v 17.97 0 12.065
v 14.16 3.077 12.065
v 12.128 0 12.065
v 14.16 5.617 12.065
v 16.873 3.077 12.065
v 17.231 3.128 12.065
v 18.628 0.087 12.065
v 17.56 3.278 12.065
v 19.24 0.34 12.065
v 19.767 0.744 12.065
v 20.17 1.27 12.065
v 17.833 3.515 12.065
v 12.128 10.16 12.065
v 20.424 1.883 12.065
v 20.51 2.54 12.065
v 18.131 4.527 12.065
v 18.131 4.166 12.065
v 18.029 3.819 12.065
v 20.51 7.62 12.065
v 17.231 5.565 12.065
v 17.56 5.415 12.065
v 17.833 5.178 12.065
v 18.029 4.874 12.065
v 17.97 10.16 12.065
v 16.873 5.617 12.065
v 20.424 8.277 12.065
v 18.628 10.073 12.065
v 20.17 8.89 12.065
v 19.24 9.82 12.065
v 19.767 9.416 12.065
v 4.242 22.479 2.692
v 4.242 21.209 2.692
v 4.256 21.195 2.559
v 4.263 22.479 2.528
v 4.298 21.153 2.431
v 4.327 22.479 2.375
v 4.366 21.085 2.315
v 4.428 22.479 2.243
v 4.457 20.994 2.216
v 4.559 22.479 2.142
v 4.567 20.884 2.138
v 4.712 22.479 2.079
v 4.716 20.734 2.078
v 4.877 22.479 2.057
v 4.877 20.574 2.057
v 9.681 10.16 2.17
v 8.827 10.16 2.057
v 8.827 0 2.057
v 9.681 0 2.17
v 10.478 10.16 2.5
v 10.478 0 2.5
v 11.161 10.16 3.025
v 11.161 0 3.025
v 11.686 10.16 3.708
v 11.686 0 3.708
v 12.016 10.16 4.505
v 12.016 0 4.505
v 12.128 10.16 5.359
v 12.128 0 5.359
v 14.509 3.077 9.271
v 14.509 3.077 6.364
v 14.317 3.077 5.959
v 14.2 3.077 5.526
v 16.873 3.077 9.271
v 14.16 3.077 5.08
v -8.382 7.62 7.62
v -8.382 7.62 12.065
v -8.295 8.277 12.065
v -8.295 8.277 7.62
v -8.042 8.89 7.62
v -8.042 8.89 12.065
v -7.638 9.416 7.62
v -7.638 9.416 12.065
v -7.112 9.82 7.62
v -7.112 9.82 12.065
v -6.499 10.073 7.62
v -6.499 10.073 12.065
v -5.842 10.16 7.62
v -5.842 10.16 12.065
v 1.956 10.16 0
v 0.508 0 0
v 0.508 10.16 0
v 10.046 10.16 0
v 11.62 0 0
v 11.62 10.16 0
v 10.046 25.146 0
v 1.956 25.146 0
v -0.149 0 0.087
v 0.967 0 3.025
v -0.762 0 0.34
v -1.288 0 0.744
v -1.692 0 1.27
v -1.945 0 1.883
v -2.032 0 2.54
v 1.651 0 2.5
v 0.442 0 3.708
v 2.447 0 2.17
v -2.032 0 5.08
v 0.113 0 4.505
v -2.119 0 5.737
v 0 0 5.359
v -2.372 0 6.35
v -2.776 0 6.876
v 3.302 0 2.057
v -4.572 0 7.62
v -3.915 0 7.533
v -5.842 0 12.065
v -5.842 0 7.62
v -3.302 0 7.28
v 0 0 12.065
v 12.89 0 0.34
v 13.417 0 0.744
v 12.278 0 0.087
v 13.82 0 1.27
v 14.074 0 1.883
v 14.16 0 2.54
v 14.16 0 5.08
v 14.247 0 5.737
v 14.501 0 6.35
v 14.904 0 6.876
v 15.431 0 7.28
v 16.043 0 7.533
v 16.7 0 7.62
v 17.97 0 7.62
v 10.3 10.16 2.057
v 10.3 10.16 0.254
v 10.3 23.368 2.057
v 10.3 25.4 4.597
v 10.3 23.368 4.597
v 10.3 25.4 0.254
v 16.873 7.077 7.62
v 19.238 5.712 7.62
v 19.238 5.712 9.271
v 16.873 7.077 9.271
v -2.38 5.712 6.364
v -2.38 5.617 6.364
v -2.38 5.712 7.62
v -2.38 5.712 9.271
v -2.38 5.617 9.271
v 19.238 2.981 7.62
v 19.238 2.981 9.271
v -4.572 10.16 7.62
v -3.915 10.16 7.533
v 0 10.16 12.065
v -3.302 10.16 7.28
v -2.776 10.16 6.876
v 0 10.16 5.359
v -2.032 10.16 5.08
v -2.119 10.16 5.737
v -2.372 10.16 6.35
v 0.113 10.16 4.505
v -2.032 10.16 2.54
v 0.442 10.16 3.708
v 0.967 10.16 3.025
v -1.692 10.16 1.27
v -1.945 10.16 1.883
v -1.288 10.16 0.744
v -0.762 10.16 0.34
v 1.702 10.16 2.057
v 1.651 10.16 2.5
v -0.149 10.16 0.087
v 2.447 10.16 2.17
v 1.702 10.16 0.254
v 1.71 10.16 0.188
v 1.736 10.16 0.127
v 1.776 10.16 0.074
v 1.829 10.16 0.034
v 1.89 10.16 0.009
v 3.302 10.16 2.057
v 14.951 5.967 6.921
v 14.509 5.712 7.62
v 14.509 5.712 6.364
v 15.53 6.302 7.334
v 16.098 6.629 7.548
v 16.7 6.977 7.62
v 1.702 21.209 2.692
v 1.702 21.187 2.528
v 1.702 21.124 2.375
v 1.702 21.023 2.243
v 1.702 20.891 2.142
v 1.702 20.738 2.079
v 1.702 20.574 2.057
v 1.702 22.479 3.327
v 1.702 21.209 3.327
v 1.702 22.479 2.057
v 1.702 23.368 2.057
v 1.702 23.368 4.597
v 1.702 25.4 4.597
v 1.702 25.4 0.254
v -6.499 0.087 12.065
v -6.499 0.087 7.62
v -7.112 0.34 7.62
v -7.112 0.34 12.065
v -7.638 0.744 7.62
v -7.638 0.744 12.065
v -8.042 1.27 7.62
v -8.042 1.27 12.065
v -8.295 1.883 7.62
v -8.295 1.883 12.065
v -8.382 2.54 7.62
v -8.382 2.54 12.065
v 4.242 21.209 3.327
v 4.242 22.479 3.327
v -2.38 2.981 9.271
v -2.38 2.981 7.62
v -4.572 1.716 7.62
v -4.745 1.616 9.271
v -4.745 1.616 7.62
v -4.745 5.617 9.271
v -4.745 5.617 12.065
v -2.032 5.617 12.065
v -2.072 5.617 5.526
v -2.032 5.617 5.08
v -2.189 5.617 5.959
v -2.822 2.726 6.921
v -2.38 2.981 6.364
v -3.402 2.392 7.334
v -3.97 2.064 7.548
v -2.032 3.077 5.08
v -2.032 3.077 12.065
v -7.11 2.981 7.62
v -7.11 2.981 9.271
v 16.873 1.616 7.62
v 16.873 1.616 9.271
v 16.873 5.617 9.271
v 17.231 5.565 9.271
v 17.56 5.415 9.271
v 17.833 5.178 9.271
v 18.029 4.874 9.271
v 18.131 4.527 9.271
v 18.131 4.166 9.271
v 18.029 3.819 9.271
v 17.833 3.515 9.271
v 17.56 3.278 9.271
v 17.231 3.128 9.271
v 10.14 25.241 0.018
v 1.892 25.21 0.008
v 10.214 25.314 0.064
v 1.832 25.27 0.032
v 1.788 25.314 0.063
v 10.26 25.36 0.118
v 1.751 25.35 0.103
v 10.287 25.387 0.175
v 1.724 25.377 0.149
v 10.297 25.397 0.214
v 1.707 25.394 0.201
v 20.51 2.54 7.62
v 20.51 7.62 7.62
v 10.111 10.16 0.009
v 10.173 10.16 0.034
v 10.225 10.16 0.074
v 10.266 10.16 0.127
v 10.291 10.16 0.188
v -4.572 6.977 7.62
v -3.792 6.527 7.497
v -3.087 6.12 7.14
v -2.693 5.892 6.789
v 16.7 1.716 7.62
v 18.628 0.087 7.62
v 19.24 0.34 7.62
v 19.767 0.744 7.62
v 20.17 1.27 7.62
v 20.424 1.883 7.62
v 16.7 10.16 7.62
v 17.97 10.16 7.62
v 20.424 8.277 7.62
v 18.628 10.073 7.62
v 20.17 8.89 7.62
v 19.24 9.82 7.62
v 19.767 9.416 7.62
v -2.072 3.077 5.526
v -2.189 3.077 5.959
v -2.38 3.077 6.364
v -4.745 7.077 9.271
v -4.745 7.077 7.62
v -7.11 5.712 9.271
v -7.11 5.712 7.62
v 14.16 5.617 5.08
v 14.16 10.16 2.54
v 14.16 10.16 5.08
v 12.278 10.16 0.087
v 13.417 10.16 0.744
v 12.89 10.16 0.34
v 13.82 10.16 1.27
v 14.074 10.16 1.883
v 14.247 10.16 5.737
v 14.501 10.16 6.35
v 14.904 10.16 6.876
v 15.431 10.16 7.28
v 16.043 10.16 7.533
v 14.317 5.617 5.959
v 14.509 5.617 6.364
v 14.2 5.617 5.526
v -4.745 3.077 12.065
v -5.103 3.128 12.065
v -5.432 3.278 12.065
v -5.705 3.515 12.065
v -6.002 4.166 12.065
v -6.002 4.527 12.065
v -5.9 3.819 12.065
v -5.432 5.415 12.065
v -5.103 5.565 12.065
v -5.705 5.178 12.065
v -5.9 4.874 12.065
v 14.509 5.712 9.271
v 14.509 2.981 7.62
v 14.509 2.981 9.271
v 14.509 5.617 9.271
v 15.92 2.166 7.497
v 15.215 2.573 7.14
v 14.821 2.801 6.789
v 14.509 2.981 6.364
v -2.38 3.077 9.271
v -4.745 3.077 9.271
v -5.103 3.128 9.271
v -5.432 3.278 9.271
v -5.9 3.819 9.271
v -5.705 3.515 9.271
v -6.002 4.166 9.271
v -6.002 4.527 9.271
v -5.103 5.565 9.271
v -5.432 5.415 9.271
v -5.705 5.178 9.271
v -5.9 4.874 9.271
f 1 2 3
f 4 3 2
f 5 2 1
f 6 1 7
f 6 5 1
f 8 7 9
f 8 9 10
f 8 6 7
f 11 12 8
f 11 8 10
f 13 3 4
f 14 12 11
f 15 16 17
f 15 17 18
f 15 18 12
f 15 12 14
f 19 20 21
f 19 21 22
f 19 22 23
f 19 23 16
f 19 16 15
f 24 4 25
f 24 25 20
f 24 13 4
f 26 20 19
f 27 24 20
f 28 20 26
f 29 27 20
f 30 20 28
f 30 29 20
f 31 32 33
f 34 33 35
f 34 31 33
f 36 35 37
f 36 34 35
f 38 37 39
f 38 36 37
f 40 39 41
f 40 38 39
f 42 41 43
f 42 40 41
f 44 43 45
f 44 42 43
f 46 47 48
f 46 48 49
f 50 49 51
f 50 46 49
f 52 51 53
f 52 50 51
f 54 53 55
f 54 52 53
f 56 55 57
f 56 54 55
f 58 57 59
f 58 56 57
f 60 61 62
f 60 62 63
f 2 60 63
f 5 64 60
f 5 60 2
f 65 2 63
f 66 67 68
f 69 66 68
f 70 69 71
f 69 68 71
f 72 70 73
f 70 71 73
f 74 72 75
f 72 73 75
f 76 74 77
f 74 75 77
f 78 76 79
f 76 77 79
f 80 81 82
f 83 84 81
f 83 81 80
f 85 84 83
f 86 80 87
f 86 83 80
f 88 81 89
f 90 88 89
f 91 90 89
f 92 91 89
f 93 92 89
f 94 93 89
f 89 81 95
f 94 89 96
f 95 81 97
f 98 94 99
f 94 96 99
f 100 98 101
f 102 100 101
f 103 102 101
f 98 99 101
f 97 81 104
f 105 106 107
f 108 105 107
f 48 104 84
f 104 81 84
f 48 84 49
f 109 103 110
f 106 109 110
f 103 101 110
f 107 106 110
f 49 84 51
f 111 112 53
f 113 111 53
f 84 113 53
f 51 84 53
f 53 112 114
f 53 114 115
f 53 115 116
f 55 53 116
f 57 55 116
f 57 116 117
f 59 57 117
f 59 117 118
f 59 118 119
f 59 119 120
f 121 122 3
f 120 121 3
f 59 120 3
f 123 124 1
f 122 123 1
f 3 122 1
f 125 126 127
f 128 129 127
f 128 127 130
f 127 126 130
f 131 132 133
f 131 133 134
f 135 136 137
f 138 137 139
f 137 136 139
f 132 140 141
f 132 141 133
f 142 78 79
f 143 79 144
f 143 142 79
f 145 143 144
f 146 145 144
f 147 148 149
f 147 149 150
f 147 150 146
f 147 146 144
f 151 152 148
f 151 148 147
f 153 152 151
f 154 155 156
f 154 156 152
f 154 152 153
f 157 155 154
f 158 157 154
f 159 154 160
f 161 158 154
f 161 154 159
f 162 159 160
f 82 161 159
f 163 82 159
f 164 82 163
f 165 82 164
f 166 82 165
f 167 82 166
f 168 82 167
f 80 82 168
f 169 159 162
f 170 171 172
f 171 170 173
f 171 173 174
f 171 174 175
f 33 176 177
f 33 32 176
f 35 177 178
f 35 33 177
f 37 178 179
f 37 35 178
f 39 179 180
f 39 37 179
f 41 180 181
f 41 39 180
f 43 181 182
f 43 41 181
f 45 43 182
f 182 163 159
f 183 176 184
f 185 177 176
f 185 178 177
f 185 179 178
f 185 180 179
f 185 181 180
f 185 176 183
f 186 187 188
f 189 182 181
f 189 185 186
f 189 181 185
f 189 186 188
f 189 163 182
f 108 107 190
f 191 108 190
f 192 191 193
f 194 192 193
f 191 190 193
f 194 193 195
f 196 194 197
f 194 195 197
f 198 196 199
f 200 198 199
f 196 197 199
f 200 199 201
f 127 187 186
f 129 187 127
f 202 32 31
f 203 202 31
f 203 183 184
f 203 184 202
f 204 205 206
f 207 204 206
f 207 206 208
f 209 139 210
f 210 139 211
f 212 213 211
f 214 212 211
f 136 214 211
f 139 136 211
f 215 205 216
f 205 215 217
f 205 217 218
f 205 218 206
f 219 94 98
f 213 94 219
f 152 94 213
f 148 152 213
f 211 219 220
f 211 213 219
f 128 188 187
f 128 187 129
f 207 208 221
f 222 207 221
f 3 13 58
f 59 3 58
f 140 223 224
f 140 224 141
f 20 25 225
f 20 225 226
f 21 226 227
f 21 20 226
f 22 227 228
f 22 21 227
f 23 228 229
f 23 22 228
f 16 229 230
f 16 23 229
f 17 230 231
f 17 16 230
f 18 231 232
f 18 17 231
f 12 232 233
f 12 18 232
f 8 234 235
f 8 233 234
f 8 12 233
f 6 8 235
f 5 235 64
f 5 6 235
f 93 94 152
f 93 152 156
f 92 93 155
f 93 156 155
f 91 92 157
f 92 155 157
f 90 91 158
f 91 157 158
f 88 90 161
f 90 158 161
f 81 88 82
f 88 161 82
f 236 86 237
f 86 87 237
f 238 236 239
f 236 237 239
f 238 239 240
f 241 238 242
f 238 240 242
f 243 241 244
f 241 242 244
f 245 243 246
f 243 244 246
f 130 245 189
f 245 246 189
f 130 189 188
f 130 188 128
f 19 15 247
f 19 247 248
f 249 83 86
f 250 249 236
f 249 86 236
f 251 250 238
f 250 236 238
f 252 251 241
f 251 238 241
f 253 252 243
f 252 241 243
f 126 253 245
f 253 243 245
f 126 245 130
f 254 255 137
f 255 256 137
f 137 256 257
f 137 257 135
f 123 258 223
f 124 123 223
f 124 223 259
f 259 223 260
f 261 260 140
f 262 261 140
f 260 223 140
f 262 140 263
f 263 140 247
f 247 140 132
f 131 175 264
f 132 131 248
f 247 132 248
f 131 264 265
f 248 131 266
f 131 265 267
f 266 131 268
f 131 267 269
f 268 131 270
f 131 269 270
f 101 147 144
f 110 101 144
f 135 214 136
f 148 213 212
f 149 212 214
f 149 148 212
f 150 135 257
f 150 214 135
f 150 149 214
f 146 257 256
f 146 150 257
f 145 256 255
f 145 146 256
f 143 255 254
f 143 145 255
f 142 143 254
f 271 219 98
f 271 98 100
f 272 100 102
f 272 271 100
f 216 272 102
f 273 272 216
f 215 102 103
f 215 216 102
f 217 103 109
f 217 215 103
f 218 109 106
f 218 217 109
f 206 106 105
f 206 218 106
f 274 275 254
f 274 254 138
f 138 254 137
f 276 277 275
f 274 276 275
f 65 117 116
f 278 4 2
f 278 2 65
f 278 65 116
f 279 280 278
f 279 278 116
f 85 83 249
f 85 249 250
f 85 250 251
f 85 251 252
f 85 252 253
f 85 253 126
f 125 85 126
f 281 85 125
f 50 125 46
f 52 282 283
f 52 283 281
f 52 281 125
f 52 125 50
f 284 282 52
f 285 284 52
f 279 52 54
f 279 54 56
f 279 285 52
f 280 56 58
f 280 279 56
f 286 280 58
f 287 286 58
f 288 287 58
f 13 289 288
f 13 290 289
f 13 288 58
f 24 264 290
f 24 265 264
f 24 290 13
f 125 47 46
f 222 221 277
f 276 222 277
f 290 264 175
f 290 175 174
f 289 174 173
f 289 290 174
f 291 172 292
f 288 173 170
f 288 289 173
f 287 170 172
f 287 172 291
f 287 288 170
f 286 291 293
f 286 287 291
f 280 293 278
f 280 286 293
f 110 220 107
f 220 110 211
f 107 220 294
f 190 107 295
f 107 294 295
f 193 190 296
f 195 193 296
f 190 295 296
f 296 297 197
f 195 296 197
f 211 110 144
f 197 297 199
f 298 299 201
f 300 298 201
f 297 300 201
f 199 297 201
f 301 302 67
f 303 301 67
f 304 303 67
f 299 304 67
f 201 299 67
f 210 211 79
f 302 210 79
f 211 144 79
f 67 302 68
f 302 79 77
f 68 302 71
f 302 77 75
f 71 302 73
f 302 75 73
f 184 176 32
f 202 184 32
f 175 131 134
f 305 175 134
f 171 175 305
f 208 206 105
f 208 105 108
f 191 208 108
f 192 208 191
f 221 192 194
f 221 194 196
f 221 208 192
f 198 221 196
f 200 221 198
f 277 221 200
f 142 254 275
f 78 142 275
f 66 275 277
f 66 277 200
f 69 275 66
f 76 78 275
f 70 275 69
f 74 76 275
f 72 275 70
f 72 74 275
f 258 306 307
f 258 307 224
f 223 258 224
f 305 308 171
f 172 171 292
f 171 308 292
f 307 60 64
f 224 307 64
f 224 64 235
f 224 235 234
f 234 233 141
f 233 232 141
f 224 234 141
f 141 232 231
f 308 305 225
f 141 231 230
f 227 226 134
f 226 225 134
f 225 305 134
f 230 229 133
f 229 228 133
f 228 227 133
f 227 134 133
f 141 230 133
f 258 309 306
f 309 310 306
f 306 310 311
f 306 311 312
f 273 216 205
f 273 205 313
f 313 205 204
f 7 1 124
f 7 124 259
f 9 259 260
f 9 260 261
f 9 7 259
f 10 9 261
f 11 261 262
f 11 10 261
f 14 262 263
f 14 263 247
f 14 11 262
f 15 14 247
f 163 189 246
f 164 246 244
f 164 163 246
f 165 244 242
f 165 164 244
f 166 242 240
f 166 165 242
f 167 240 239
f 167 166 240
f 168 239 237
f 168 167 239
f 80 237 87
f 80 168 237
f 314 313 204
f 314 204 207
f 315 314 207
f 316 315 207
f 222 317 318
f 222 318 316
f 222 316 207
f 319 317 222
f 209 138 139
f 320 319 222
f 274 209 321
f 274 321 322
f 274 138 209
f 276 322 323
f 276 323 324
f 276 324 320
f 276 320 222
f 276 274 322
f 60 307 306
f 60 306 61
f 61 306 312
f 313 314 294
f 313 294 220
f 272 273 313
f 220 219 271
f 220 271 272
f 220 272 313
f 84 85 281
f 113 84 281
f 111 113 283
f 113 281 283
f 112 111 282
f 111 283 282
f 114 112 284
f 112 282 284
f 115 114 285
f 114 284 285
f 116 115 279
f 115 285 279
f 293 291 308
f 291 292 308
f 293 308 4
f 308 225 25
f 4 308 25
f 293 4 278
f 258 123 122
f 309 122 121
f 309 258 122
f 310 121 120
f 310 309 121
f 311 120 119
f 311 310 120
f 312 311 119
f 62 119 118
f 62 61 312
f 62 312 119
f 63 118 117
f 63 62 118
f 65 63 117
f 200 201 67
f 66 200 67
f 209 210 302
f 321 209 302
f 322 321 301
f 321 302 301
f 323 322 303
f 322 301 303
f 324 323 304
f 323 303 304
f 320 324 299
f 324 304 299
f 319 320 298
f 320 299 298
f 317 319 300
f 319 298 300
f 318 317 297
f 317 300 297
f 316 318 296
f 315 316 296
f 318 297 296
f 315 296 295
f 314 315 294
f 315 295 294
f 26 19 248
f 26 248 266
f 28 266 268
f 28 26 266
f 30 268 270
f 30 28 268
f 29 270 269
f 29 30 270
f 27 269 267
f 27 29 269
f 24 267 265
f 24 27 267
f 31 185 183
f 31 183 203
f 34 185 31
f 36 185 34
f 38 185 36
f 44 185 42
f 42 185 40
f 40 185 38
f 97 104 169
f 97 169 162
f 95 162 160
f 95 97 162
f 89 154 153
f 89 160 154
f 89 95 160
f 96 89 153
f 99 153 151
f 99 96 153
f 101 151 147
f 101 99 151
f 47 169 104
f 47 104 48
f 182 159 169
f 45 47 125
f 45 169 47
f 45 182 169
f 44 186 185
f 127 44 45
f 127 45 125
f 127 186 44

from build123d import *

# Parameters (mm, degrees)
BOSS_EXTRUDE1_DEPTH = 2.0574
SKETCH4_W           = 12.065
SKETCH4_H           = 10.16
BOSS_EXTRUDE2_DEPTH = 2.032
SKETCH5_W           = 12.065
SKETCH5_H           = 10.16
BOSS_EXTRUDE3_DEPTH = 2.032
SKETCH8_W           = 8.5979
SKETCH8_H           = 2.032
BOSS_EXTRUDE4_DEPTH = 2.54
FILLET22_R          = 3.302
CUT_EXTRUDE12_DEPTH = 13.208
SKETCH28_W          = 2.54
SKETCH28_H          = 1.27
BOSS_EXTRUDE6_DEPTH = 1.27
BOSS_EXTRUDE7_DEPTH = 4.445
FILLET23_R          = 0.635
CUT_EXTRUDE15_DEPTH = 1.651
FILLET25_R          = 0.254
FILLET26_R          = 2.54


with BuildPart() as part:
    # Sketch1 → Boss-Extrude1 (new body)
    with BuildSketch(Plane.XY):
        Polygon((0, 0), (12.1285, 0), (12.1285, 10.16), (10.2997, 10.16), (10.2997, 25.4), (1.7018, 25.4), (1.7018, 10.16), (0, 10.16), align=None)
    extrude(amount=BOSS_EXTRUDE1_DEPTH)

    # Sketch4 → Boss-Extrude2 (add)
    with BuildSketch(Plane(origin=(12.1285, 0, 0), x_dir=(0, 0, -1), z_dir=(1, 0, 0))):
        with Locations((-6.0325, 5.08)):
            Rectangle(SKETCH4_W, SKETCH4_H)
    extrude(amount=BOSS_EXTRUDE2_DEPTH)

    # Sketch5 → Boss-Extrude3 (add)
    with BuildSketch(Plane.ZY):
        with Locations((6.0325, 5.08)):
            Rectangle(SKETCH5_W, SKETCH5_H)
    extrude(amount=BOSS_EXTRUDE3_DEPTH)

    # Sketch8 → Boss-Extrude4 (add)
    with BuildSketch(Plane.XY.offset(2.0574)):
        with Locations((6.00075, 24.384)):
            Rectangle(SKETCH8_W, SKETCH8_H)
    extrude(amount=BOSS_EXTRUDE4_DEPTH)

    # Fillet22
    fillet22_edges = [part.edges().sort_by_distance(p)[0] for p in [
        (12.1285, 5.08, 2.0574),
        (0, 5.08, 2.0574),
    ]]
    fillet(fillet22_edges, radius=FILLET22_R)

    # Sketch26 → Cut-Extrude12 (cut)
    with BuildSketch(Plane.XZ.offset(-23.368)):
        Polygon((8.382, 4.5974), (1.7018, 4.5974), (1.620324679, 2.0574), (10.2997, 2.0574), (10.2997, 4.5974), align=None)
    extrude(amount=CUT_EXTRUDE12_DEPTH, mode=Mode.SUBTRACT)

    # Sketch28 → Boss-Extrude6 (add)
    with BuildSketch(Plane.XY.offset(2.0574)):
        with Locations((2.9718, 21.844)):
            Rectangle(SKETCH28_W, SKETCH28_H)
    extrude(amount=BOSS_EXTRUDE6_DEPTH)

    # Sketch30 → Boss-Extrude7 (add)
    with BuildSketch(Plane(origin=(0, 0, 12.065), x_dir=(-1, 0, 0), z_dir=(0, 0, -1))):
        with BuildLine():
            Line((2.032, 3.076559617), (2.032, 0))
            Line((2.032, 0), (5.842, 0))
            ThreePointArc((5.842, 0), (7.638051224, 0.743948776), (8.382, 2.54))
            Line((8.382, 2.54), (8.382, 7.62))
            ThreePointArc((8.382, 7.62), (7.638051224, 9.416051224), (5.842, 10.16))
            Line((5.842, 10.16), (2.032, 10.16))
            Line((2.032, 10.16), (2.032, 5.616559617))
            Line((2.032, 5.616559617), (4.744929833, 5.616559617))
            ThreePointArc((4.744929833, 5.616559617), (6.014929833, 4.346559617), (4.744929833, 3.076559617))
            Line((4.744929833, 3.076559617), (2.032, 3.076559617))
        make_face()
    boss_extrude7 = extrude(amount=BOSS_EXTRUDE7_DEPTH)

    # Fillet23
    fillet23_edges = [part.edges().sort_by_distance(p)[0] for p in [
        (2.9718, 21.209, 2.0574),
        (4.2418, 21.844, 2.0574),
    ]]
    fillet(fillet23_edges, radius=FILLET23_R)

    # Sketch34 → Cut-Extrude15 (cut)
    with BuildSketch(Plane(origin=(0, 0, 7.62), x_dir=(-1, 0, 0), z_dir=(0, 0, -1))):
        Polygon((4.744929833, 7.077059617), (2.380247468, 5.711809617), (2.380247468, 2.981309617), (4.744929833, 1.616059617), (7.109612198, 2.981309617), (7.109612198, 5.711809617), align=None)
    cut_extrude15 = extrude(amount=-CUT_EXTRUDE15_DEPTH, mode=Mode.SUBTRACT)

    # Fillet25
    fillet25_edges = [part.edges().sort_by_distance(p)[0] for p in [
        (1.7018, 17.78, 0),
        (6.00075, 25.4, 0),
        (10.2997, 17.78, 0),
    ]]
    fillet(fillet25_edges, radius=FILLET25_R)

    # Mirror7: Boss-Extrude7, Cut-Extrude15 across plane
    add(boss_extrude7.mirror(Plane(origin=(6.06425, 0, 0), x_dir=(0, 0, 1), z_dir=(1, 0, 0))))
    add(cut_extrude15.mirror(Plane(origin=(6.06425, 0, 0), x_dir=(0, 0, 1), z_dir=(1, 0, 0))), mode=Mode.SUBTRACT)

    # Fillet26
    # the kernel refuses this fillet: 2.54 mm, written as the material it adds along each edge
    with BuildSketch(Plane(origin=(-2.032, 9.426559617, 7.62), x_dir=(-1, 0, 0), z_dir=(0, -1, 0))) as fillet26_piece_1_section:
        with BuildLine():
            CenterArc((FILLET26_R, FILLET26_R), FILLET26_R, 180, 90)
            Line((0, FILLET26_R), (0, 0))
            Line((0, 0), (FILLET26_R, 0))
        make_face()
    fillet26_piece_1 = extrude(amount=15.776559617, mode=Mode.PRIVATE)
    fillet26_piece_1 = split(fillet26_piece_1, bisect_by=Plane(origin=(-2.868298698, 5.616559617, 7.255726229), z_dir=(0, 1, 0)), keep=Keep.TOP, mode=Mode.PRIVATE)
    fillet26_piece_1 = split(fillet26_piece_1, bisect_by=Plane(origin=(-3.61155926, 6.422707812, 7.255726229), z_dir=(0.5000000000000006, 0.8660254037844384, 0)), keep=Keep.TOP, mode=Mode.PRIVATE)
    add(fillet26_piece_1)
    with BuildSketch(Plane(origin=(-2.032, 9.426559617, 7.62), x_dir=(-1, 0, 0), z_dir=(0, -1, 0))) as fillet26_piece_2_section:
        with BuildLine():
            CenterArc((FILLET26_R, FILLET26_R), FILLET26_R, 180, 90)
            Line((0, FILLET26_R), (0, 0))
            Line((0, 0), (FILLET26_R, 0))
        make_face()
    fillet26_piece_2 = extrude(amount=15.776559617, mode=Mode.PRIVATE)
    fillet26_piece_2 = split(fillet26_piece_2, bisect_by=Plane(origin=(-2.323081937, 5.616559617, 6.938732997), z_dir=(0, 1, 0)), keep=Keep.TOP, mode=Mode.PRIVATE)
    fillet26_piece_2 = split(fillet26_piece_2, bisect_by=Plane(origin=(-2.380247468, 5.647682341, 6.938732997), z_dir=(1, 0, 0)), keep=Keep.TOP, mode=Mode.PRIVATE)
    add(fillet26_piece_2)
    with BuildSketch(Plane(origin=(-2.032, 3.076559617, 7.62), x_dir=(-1, 0, 0), z_dir=(0, -1, 0))) as fillet26_piece_3_section:
        with BuildLine():
            CenterArc((FILLET26_R, FILLET26_R), FILLET26_R, 180, 90)
            Line((0, FILLET26_R), (0, 0))
            Line((0, 0), (FILLET26_R, 0))
        make_face()
    fillet26_piece_3 = extrude(amount=3.076559617, mode=Mode.PRIVATE)
    fillet26_piece_3 = split(fillet26_piece_3, bisect_by=Plane(origin=(-2.380247468, 3.045436894, 6.938732997), z_dir=(1, 0, 0)), keep=Keep.TOP, mode=Mode.PRIVATE)
    add(fillet26_piece_3)
    with BuildSketch(Plane(origin=(-2.032, 9.426559617, 7.62), x_dir=(-1, 0, 0), z_dir=(0, -1, 0))) as fillet26_piece_4_section:
        with BuildLine():
            CenterArc((FILLET26_R, FILLET26_R), FILLET26_R, 180, 90)
            Line((0, FILLET26_R), (0, 0))
            Line((0, 0), (FILLET26_R, 0))
        make_face()
    fillet26_piece_4 = extrude(amount=9.426559617, mode=Mode.PRIVATE)
    fillet26_piece_4 = split(fillet26_piece_4, bisect_by=Plane(origin=(-2.380247468, 1.352070174, 7.252623905), z_dir=(-1, 0, 0)), keep=Keep.TOP, mode=Mode.PRIVATE)
    fillet26_piece_4 = split(fillet26_piece_4, bisect_by=Plane(origin=(-3.445782292, 2.3661228, 7.252623905), z_dir=(0.5000000000000002, -0.8660254037844386, 0)), keep=Keep.TOP, mode=Mode.PRIVATE)
    add(fillet26_piece_4)
    with BuildSketch(Plane(origin=(-2.032, 10.16, 7.62), x_dir=(-1, 0, 0), z_dir=(0, -1, 0))) as fillet26_piece_5_section:
        with BuildLine():
            CenterArc((FILLET26_R, FILLET26_R), FILLET26_R, 180, 90)
            Line((0, FILLET26_R), (0, 0))
            Line((0, 0), (FILLET26_R, 0))
        make_face()
    fillet26_piece_5 = extrude(amount=4.543440383, mode=Mode.PRIVATE)
    fillet26_piece_5 = split(fillet26_piece_5, bisect_by=Plane(origin=(-3.774867909, 6.516994104, 7.257731874), z_dir=(0.5000000000000006, 0.8660254037844384, 0)), keep=Keep.TOP, mode=Mode.PRIVATE)
    add(fillet26_piece_5)
    with BuildSketch(Plane(origin=(-2.032, 16.51, 7.62), x_dir=(-1, 0, 0), z_dir=(0, -1, 0))) as fillet26_piece_6_section:
        with BuildLine():
            CenterArc((FILLET26_R, FILLET26_R), FILLET26_R, 180, 90)
            Line((0, FILLET26_R), (0, 0))
            Line((0, 0), (FILLET26_R, 0))
        make_face()
    fillet26_piece_6 = extrude(amount=10.893440383, mode=Mode.PRIVATE)
    fillet26_piece_6 = split(fillet26_piece_6, bisect_by=Plane(origin=(-2.380247468, 5.647682341, 6.938732997), z_dir=(1, 0, 0)), keep=Keep.TOP, mode=Mode.PRIVATE)
    fillet26_piece_6 = split(fillet26_piece_6, bisect_by=Plane(origin=(-2.309605395, 5.671024397, 6.938732997), z_dir=(-0.5000000000000006, -0.8660254037844384, 0)), keep=Keep.TOP, mode=Mode.PRIVATE)
    add(fillet26_piece_6)
    with BuildSketch(Plane(origin=(-2.032, 16.51, 7.62), x_dir=(-1, 0, 0), z_dir=(0, -1, 0))) as fillet26_piece_7_section:
        with BuildLine():
            CenterArc((FILLET26_R, FILLET26_R), FILLET26_R, 180, 90)
            Line((0, FILLET26_R), (0, 0))
            Line((0, 0), (FILLET26_R, 0))
        make_face()
    fillet26_piece_7 = extrude(amount=17.243440383, mode=Mode.PRIVATE)
    fillet26_piece_7 = split(fillet26_piece_7, bisect_by=Plane(origin=(-2.323081937, 0, 6.938732997), z_dir=(0, 1, 0)), keep=Keep.TOP, mode=Mode.PRIVATE)
    fillet26_piece_7 = split(fillet26_piece_7, bisect_by=Plane(origin=(-2.323081937, 3.076559617, 6.938732997), z_dir=(0, -1, 0)), keep=Keep.TOP, mode=Mode.PRIVATE)
    fillet26_piece_7 = split(fillet26_piece_7, bisect_by=Plane(origin=(-2.380247468, 3.045436894, 6.938732997), z_dir=(1, 0, 0)), keep=Keep.TOP, mode=Mode.PRIVATE)
    add(fillet26_piece_7)
    with BuildSketch(Plane(origin=(-2.032, 16.51, 7.62), x_dir=(-1, 0, 0), z_dir=(0, -1, 0))) as fillet26_piece_8_section:
        with BuildLine():
            CenterArc((FILLET26_R, FILLET26_R), FILLET26_R, 180, 90)
            Line((0, FILLET26_R), (0, 0))
            Line((0, 0), (FILLET26_R, 0))
        make_face()
    fillet26_piece_8 = extrude(amount=17.243440383, mode=Mode.PRIVATE)
    fillet26_piece_8 = split(fillet26_piece_8, bisect_by=Plane(origin=(-2.860318736, 0, 7.252623905), z_dir=(0, 1, 0)), keep=Keep.TOP, mode=Mode.PRIVATE)
    fillet26_piece_8 = split(fillet26_piece_8, bisect_by=Plane(origin=(-2.380247468, 1.352070174, 7.252623905), z_dir=(-1, 0, 0)), keep=Keep.TOP, mode=Mode.PRIVATE)
    fillet26_piece_8 = split(fillet26_piece_8, bisect_by=Plane(origin=(-3.445782292, 2.3661228, 7.252623905), z_dir=(0.5000000000000002, -0.8660254037844386, 0)), keep=Keep.TOP, mode=Mode.PRIVATE)
    add(fillet26_piece_8)
    with BuildSketch(Plane(origin=(14.1605, 9.426559617, 7.62), x_dir=(0, 0, -1), z_dir=(0, -1, 0))) as fillet26_piece_9_section:
        with BuildLine():
            CenterArc((FILLET26_R, FILLET26_R), FILLET26_R, 180, 90)
            Line((0, FILLET26_R), (0, 0))
            Line((0, 0), (FILLET26_R, 0))
        make_face()
    fillet26_piece_9 = extrude(amount=15.776559617, mode=Mode.PRIVATE)
    fillet26_piece_9 = split(fillet26_piece_9, bisect_by=Plane(origin=(14.316328874, 5.616559617, 6.756250479), z_dir=(0, 1, 0)), keep=Keep.TOP, mode=Mode.PRIVATE)
    fillet26_piece_9 = split(fillet26_piece_9, bisect_by=Plane(origin=(14.508747468, 7.530619089, 6.756250479), z_dir=(-1, 0, 0)), keep=Keep.TOP, mode=Mode.PRIVATE)
    add(fillet26_piece_9)
    with BuildSketch(Plane(origin=(14.1605, 9.426559617, 7.62), x_dir=(0, 0, -1), z_dir=(0, -1, 0))) as fillet26_piece_10_section:
        with BuildLine():
            CenterArc((FILLET26_R, FILLET26_R), FILLET26_R, 180, 90)
            Line((0, FILLET26_R), (0, 0))
            Line((0, 0), (FILLET26_R, 0))
        make_face()
    fillet26_piece_10 = extrude(amount=15.776559617, mode=Mode.PRIVATE)
    fillet26_piece_10 = split(fillet26_piece_10, bisect_by=Plane(origin=(14.508747468, 7.710072871, 7.255726229), z_dir=(1, 0, 0)), keep=Keep.TOP, mode=Mode.PRIVATE)
    fillet26_piece_10 = split(fillet26_piece_10, bisect_by=Plane(origin=(15.740059261, 6.422707812, 7.255726229), z_dir=(-0.5000000000000006, 0.8660254037844384, 0)), keep=Keep.TOP, mode=Mode.PRIVATE)
    add(fillet26_piece_10)
    with BuildSketch(Plane(origin=(14.1605, 3.076559617, 7.62), x_dir=(0, 0, -1), z_dir=(0, -1, 0))) as fillet26_piece_11_section:
        with BuildLine():
            CenterArc((FILLET26_R, FILLET26_R), FILLET26_R, 180, 90)
            Line((0, FILLET26_R), (0, 0))
            Line((0, 0), (FILLET26_R, 0))
        make_face()
    fillet26_piece_11 = extrude(amount=3.076559617, mode=Mode.PRIVATE)
    fillet26_piece_11 = split(fillet26_piece_11, bisect_by=Plane(origin=(14.508747468, 3.04543688, 6.938733061), z_dir=(-1, 0, 0)), keep=Keep.TOP, mode=Mode.PRIVATE)
    add(fillet26_piece_11)
    with BuildSketch(Plane(origin=(14.1605, 9.426559617, 7.62), x_dir=(0, 0, -1), z_dir=(0, -1, 0))) as fillet26_piece_12_section:
        with BuildLine():
            CenterArc((FILLET26_R, FILLET26_R), FILLET26_R, 180, 90)
            Line((0, FILLET26_R), (0, 0))
            Line((0, 0), (FILLET26_R, 0))
        make_face()
    fillet26_piece_12 = extrude(amount=9.426559617, mode=Mode.PRIVATE)
    fillet26_piece_12 = split(fillet26_piece_12, bisect_by=Plane(origin=(14.508747468, 1.352070172, 7.252623905), z_dir=(1, 0, 0)), keep=Keep.TOP, mode=Mode.PRIVATE)
    fillet26_piece_12 = split(fillet26_piece_12, bisect_by=Plane(origin=(15.574282292, 2.3661228, 7.252623905), z_dir=(-0.5000000000000002, -0.8660254037844386, 0)), keep=Keep.TOP, mode=Mode.PRIVATE)
    add(fillet26_piece_12)
    with BuildSketch(Plane(origin=(14.1605, 10.16, 7.62), x_dir=(0, 0, -1), z_dir=(0, -1, 0))) as fillet26_piece_13_section:
        with BuildLine():
            CenterArc((FILLET26_R, FILLET26_R), FILLET26_R, 180, 90)
            Line((0, FILLET26_R), (0, 0))
            Line((0, 0), (FILLET26_R, 0))
        make_face()
    fillet26_piece_13 = extrude(amount=4.543440383, mode=Mode.PRIVATE)
    fillet26_piece_13 = split(fillet26_piece_13, bisect_by=Plane(origin=(14.508747468, 7.897356486, 6.756392786), z_dir=(-1, 0, 0)), keep=Keep.TOP, mode=Mode.PRIVATE)
    add(fillet26_piece_13)
    with BuildSketch(Plane(origin=(14.1605, 10.16, 7.62), x_dir=(0, 0, -1), z_dir=(0, -1, 0))) as fillet26_piece_14_section:
        with BuildLine():
            CenterArc((FILLET26_R, FILLET26_R), FILLET26_R, 180, 90)
            Line((0, FILLET26_R), (0, 0))
            Line((0, 0), (FILLET26_R, 0))
        make_face()
    fillet26_piece_14 = extrude(amount=10.893440383, mode=Mode.PRIVATE)
    fillet26_piece_14 = split(fillet26_piece_14, bisect_by=Plane(origin=(14.508747468, 8.078282345, 7.257731874), z_dir=(1, 0, 0)), keep=Keep.TOP, mode=Mode.PRIVATE)
    fillet26_piece_14 = split(fillet26_piece_14, bisect_by=Plane(origin=(15.903367909, 6.516994104, 7.257731874), z_dir=(-0.5000000000000006, 0.8660254037844384, 0)), keep=Keep.TOP, mode=Mode.PRIVATE)
    add(fillet26_piece_14)
    with BuildSketch(Plane(origin=(14.1605, 16.51, 7.62), x_dir=(0, 0, -1), z_dir=(0, -1, 0))) as fillet26_piece_15_section:
        with BuildLine():
            CenterArc((FILLET26_R, FILLET26_R), FILLET26_R, 180, 90)
            Line((0, FILLET26_R), (0, 0))
            Line((0, 0), (FILLET26_R, 0))
        make_face()
    fillet26_piece_15 = extrude(amount=17.243440383, mode=Mode.PRIVATE)
    fillet26_piece_15 = split(fillet26_piece_15, bisect_by=Plane(origin=(14.451581939, 0, 6.938733061), z_dir=(0, 1, 0)), keep=Keep.TOP, mode=Mode.PRIVATE)
    fillet26_piece_15 = split(fillet26_piece_15, bisect_by=Plane(origin=(14.451581939, 3.076559617, 6.938733061), z_dir=(0, -1, 0)), keep=Keep.TOP, mode=Mode.PRIVATE)
    fillet26_piece_15 = split(fillet26_piece_15, bisect_by=Plane(origin=(14.508747468, 3.04543688, 6.938733061), z_dir=(-1, 0, 0)), keep=Keep.TOP, mode=Mode.PRIVATE)
    add(fillet26_piece_15)
    with BuildSketch(Plane(origin=(14.1605, 16.51, 7.62), x_dir=(0, 0, -1), z_dir=(0, -1, 0))) as fillet26_piece_16_section:
        with BuildLine():
            CenterArc((FILLET26_R, FILLET26_R), FILLET26_R, 180, 90)
            Line((0, FILLET26_R), (0, 0))
            Line((0, 0), (FILLET26_R, 0))
        make_face()
    fillet26_piece_16 = extrude(amount=17.243440383, mode=Mode.PRIVATE)
    fillet26_piece_16 = split(fillet26_piece_16, bisect_by=Plane(origin=(14.988818735, 0, 7.252623905), z_dir=(0, 1, 0)), keep=Keep.TOP, mode=Mode.PRIVATE)
    fillet26_piece_16 = split(fillet26_piece_16, bisect_by=Plane(origin=(14.508747468, 1.352070172, 7.252623905), z_dir=(1, 0, 0)), keep=Keep.TOP, mode=Mode.PRIVATE)
    fillet26_piece_16 = split(fillet26_piece_16, bisect_by=Plane(origin=(15.574282292, 2.3661228, 7.252623905), z_dir=(-0.5000000000000002, -0.8660254037844386, 0)), keep=Keep.TOP, mode=Mode.PRIVATE)
    add(fillet26_piece_16)
    # the kernel refuses this fillet: 2.54 mm, written as the material it takes off along each edge
    with BuildSketch(Plane(origin=(-2.032, 16.51, 0), x_dir=(1, 0, 0), z_dir=(0, -1, 0))) as fillet26_2_piece_1:
        with BuildLine():
            CenterArc((FILLET26_R, FILLET26_R), FILLET26_R, 180, 90)
            Line((0, FILLET26_R), (0, 0))
            Line((0, 0), (FILLET26_R, 0))
        make_face()
    extrude(amount=22.86, mode=Mode.SUBTRACT)
    with BuildSketch(Plane(origin=(14.1605, 16.51, 0), x_dir=(-1, 0, 0), z_dir=(0, -1, 0))) as fillet26_2_piece_2:
        with BuildLine():
            CenterArc((FILLET26_R, -FILLET26_R), FILLET26_R, 90, 90)
            Line((0, -FILLET26_R), (0, 0))
            Line((0, 0), (FILLET26_R, 0))
        make_face()
    extrude(amount=22.86, mode=Mode.SUBTRACT)


solid = part.part
